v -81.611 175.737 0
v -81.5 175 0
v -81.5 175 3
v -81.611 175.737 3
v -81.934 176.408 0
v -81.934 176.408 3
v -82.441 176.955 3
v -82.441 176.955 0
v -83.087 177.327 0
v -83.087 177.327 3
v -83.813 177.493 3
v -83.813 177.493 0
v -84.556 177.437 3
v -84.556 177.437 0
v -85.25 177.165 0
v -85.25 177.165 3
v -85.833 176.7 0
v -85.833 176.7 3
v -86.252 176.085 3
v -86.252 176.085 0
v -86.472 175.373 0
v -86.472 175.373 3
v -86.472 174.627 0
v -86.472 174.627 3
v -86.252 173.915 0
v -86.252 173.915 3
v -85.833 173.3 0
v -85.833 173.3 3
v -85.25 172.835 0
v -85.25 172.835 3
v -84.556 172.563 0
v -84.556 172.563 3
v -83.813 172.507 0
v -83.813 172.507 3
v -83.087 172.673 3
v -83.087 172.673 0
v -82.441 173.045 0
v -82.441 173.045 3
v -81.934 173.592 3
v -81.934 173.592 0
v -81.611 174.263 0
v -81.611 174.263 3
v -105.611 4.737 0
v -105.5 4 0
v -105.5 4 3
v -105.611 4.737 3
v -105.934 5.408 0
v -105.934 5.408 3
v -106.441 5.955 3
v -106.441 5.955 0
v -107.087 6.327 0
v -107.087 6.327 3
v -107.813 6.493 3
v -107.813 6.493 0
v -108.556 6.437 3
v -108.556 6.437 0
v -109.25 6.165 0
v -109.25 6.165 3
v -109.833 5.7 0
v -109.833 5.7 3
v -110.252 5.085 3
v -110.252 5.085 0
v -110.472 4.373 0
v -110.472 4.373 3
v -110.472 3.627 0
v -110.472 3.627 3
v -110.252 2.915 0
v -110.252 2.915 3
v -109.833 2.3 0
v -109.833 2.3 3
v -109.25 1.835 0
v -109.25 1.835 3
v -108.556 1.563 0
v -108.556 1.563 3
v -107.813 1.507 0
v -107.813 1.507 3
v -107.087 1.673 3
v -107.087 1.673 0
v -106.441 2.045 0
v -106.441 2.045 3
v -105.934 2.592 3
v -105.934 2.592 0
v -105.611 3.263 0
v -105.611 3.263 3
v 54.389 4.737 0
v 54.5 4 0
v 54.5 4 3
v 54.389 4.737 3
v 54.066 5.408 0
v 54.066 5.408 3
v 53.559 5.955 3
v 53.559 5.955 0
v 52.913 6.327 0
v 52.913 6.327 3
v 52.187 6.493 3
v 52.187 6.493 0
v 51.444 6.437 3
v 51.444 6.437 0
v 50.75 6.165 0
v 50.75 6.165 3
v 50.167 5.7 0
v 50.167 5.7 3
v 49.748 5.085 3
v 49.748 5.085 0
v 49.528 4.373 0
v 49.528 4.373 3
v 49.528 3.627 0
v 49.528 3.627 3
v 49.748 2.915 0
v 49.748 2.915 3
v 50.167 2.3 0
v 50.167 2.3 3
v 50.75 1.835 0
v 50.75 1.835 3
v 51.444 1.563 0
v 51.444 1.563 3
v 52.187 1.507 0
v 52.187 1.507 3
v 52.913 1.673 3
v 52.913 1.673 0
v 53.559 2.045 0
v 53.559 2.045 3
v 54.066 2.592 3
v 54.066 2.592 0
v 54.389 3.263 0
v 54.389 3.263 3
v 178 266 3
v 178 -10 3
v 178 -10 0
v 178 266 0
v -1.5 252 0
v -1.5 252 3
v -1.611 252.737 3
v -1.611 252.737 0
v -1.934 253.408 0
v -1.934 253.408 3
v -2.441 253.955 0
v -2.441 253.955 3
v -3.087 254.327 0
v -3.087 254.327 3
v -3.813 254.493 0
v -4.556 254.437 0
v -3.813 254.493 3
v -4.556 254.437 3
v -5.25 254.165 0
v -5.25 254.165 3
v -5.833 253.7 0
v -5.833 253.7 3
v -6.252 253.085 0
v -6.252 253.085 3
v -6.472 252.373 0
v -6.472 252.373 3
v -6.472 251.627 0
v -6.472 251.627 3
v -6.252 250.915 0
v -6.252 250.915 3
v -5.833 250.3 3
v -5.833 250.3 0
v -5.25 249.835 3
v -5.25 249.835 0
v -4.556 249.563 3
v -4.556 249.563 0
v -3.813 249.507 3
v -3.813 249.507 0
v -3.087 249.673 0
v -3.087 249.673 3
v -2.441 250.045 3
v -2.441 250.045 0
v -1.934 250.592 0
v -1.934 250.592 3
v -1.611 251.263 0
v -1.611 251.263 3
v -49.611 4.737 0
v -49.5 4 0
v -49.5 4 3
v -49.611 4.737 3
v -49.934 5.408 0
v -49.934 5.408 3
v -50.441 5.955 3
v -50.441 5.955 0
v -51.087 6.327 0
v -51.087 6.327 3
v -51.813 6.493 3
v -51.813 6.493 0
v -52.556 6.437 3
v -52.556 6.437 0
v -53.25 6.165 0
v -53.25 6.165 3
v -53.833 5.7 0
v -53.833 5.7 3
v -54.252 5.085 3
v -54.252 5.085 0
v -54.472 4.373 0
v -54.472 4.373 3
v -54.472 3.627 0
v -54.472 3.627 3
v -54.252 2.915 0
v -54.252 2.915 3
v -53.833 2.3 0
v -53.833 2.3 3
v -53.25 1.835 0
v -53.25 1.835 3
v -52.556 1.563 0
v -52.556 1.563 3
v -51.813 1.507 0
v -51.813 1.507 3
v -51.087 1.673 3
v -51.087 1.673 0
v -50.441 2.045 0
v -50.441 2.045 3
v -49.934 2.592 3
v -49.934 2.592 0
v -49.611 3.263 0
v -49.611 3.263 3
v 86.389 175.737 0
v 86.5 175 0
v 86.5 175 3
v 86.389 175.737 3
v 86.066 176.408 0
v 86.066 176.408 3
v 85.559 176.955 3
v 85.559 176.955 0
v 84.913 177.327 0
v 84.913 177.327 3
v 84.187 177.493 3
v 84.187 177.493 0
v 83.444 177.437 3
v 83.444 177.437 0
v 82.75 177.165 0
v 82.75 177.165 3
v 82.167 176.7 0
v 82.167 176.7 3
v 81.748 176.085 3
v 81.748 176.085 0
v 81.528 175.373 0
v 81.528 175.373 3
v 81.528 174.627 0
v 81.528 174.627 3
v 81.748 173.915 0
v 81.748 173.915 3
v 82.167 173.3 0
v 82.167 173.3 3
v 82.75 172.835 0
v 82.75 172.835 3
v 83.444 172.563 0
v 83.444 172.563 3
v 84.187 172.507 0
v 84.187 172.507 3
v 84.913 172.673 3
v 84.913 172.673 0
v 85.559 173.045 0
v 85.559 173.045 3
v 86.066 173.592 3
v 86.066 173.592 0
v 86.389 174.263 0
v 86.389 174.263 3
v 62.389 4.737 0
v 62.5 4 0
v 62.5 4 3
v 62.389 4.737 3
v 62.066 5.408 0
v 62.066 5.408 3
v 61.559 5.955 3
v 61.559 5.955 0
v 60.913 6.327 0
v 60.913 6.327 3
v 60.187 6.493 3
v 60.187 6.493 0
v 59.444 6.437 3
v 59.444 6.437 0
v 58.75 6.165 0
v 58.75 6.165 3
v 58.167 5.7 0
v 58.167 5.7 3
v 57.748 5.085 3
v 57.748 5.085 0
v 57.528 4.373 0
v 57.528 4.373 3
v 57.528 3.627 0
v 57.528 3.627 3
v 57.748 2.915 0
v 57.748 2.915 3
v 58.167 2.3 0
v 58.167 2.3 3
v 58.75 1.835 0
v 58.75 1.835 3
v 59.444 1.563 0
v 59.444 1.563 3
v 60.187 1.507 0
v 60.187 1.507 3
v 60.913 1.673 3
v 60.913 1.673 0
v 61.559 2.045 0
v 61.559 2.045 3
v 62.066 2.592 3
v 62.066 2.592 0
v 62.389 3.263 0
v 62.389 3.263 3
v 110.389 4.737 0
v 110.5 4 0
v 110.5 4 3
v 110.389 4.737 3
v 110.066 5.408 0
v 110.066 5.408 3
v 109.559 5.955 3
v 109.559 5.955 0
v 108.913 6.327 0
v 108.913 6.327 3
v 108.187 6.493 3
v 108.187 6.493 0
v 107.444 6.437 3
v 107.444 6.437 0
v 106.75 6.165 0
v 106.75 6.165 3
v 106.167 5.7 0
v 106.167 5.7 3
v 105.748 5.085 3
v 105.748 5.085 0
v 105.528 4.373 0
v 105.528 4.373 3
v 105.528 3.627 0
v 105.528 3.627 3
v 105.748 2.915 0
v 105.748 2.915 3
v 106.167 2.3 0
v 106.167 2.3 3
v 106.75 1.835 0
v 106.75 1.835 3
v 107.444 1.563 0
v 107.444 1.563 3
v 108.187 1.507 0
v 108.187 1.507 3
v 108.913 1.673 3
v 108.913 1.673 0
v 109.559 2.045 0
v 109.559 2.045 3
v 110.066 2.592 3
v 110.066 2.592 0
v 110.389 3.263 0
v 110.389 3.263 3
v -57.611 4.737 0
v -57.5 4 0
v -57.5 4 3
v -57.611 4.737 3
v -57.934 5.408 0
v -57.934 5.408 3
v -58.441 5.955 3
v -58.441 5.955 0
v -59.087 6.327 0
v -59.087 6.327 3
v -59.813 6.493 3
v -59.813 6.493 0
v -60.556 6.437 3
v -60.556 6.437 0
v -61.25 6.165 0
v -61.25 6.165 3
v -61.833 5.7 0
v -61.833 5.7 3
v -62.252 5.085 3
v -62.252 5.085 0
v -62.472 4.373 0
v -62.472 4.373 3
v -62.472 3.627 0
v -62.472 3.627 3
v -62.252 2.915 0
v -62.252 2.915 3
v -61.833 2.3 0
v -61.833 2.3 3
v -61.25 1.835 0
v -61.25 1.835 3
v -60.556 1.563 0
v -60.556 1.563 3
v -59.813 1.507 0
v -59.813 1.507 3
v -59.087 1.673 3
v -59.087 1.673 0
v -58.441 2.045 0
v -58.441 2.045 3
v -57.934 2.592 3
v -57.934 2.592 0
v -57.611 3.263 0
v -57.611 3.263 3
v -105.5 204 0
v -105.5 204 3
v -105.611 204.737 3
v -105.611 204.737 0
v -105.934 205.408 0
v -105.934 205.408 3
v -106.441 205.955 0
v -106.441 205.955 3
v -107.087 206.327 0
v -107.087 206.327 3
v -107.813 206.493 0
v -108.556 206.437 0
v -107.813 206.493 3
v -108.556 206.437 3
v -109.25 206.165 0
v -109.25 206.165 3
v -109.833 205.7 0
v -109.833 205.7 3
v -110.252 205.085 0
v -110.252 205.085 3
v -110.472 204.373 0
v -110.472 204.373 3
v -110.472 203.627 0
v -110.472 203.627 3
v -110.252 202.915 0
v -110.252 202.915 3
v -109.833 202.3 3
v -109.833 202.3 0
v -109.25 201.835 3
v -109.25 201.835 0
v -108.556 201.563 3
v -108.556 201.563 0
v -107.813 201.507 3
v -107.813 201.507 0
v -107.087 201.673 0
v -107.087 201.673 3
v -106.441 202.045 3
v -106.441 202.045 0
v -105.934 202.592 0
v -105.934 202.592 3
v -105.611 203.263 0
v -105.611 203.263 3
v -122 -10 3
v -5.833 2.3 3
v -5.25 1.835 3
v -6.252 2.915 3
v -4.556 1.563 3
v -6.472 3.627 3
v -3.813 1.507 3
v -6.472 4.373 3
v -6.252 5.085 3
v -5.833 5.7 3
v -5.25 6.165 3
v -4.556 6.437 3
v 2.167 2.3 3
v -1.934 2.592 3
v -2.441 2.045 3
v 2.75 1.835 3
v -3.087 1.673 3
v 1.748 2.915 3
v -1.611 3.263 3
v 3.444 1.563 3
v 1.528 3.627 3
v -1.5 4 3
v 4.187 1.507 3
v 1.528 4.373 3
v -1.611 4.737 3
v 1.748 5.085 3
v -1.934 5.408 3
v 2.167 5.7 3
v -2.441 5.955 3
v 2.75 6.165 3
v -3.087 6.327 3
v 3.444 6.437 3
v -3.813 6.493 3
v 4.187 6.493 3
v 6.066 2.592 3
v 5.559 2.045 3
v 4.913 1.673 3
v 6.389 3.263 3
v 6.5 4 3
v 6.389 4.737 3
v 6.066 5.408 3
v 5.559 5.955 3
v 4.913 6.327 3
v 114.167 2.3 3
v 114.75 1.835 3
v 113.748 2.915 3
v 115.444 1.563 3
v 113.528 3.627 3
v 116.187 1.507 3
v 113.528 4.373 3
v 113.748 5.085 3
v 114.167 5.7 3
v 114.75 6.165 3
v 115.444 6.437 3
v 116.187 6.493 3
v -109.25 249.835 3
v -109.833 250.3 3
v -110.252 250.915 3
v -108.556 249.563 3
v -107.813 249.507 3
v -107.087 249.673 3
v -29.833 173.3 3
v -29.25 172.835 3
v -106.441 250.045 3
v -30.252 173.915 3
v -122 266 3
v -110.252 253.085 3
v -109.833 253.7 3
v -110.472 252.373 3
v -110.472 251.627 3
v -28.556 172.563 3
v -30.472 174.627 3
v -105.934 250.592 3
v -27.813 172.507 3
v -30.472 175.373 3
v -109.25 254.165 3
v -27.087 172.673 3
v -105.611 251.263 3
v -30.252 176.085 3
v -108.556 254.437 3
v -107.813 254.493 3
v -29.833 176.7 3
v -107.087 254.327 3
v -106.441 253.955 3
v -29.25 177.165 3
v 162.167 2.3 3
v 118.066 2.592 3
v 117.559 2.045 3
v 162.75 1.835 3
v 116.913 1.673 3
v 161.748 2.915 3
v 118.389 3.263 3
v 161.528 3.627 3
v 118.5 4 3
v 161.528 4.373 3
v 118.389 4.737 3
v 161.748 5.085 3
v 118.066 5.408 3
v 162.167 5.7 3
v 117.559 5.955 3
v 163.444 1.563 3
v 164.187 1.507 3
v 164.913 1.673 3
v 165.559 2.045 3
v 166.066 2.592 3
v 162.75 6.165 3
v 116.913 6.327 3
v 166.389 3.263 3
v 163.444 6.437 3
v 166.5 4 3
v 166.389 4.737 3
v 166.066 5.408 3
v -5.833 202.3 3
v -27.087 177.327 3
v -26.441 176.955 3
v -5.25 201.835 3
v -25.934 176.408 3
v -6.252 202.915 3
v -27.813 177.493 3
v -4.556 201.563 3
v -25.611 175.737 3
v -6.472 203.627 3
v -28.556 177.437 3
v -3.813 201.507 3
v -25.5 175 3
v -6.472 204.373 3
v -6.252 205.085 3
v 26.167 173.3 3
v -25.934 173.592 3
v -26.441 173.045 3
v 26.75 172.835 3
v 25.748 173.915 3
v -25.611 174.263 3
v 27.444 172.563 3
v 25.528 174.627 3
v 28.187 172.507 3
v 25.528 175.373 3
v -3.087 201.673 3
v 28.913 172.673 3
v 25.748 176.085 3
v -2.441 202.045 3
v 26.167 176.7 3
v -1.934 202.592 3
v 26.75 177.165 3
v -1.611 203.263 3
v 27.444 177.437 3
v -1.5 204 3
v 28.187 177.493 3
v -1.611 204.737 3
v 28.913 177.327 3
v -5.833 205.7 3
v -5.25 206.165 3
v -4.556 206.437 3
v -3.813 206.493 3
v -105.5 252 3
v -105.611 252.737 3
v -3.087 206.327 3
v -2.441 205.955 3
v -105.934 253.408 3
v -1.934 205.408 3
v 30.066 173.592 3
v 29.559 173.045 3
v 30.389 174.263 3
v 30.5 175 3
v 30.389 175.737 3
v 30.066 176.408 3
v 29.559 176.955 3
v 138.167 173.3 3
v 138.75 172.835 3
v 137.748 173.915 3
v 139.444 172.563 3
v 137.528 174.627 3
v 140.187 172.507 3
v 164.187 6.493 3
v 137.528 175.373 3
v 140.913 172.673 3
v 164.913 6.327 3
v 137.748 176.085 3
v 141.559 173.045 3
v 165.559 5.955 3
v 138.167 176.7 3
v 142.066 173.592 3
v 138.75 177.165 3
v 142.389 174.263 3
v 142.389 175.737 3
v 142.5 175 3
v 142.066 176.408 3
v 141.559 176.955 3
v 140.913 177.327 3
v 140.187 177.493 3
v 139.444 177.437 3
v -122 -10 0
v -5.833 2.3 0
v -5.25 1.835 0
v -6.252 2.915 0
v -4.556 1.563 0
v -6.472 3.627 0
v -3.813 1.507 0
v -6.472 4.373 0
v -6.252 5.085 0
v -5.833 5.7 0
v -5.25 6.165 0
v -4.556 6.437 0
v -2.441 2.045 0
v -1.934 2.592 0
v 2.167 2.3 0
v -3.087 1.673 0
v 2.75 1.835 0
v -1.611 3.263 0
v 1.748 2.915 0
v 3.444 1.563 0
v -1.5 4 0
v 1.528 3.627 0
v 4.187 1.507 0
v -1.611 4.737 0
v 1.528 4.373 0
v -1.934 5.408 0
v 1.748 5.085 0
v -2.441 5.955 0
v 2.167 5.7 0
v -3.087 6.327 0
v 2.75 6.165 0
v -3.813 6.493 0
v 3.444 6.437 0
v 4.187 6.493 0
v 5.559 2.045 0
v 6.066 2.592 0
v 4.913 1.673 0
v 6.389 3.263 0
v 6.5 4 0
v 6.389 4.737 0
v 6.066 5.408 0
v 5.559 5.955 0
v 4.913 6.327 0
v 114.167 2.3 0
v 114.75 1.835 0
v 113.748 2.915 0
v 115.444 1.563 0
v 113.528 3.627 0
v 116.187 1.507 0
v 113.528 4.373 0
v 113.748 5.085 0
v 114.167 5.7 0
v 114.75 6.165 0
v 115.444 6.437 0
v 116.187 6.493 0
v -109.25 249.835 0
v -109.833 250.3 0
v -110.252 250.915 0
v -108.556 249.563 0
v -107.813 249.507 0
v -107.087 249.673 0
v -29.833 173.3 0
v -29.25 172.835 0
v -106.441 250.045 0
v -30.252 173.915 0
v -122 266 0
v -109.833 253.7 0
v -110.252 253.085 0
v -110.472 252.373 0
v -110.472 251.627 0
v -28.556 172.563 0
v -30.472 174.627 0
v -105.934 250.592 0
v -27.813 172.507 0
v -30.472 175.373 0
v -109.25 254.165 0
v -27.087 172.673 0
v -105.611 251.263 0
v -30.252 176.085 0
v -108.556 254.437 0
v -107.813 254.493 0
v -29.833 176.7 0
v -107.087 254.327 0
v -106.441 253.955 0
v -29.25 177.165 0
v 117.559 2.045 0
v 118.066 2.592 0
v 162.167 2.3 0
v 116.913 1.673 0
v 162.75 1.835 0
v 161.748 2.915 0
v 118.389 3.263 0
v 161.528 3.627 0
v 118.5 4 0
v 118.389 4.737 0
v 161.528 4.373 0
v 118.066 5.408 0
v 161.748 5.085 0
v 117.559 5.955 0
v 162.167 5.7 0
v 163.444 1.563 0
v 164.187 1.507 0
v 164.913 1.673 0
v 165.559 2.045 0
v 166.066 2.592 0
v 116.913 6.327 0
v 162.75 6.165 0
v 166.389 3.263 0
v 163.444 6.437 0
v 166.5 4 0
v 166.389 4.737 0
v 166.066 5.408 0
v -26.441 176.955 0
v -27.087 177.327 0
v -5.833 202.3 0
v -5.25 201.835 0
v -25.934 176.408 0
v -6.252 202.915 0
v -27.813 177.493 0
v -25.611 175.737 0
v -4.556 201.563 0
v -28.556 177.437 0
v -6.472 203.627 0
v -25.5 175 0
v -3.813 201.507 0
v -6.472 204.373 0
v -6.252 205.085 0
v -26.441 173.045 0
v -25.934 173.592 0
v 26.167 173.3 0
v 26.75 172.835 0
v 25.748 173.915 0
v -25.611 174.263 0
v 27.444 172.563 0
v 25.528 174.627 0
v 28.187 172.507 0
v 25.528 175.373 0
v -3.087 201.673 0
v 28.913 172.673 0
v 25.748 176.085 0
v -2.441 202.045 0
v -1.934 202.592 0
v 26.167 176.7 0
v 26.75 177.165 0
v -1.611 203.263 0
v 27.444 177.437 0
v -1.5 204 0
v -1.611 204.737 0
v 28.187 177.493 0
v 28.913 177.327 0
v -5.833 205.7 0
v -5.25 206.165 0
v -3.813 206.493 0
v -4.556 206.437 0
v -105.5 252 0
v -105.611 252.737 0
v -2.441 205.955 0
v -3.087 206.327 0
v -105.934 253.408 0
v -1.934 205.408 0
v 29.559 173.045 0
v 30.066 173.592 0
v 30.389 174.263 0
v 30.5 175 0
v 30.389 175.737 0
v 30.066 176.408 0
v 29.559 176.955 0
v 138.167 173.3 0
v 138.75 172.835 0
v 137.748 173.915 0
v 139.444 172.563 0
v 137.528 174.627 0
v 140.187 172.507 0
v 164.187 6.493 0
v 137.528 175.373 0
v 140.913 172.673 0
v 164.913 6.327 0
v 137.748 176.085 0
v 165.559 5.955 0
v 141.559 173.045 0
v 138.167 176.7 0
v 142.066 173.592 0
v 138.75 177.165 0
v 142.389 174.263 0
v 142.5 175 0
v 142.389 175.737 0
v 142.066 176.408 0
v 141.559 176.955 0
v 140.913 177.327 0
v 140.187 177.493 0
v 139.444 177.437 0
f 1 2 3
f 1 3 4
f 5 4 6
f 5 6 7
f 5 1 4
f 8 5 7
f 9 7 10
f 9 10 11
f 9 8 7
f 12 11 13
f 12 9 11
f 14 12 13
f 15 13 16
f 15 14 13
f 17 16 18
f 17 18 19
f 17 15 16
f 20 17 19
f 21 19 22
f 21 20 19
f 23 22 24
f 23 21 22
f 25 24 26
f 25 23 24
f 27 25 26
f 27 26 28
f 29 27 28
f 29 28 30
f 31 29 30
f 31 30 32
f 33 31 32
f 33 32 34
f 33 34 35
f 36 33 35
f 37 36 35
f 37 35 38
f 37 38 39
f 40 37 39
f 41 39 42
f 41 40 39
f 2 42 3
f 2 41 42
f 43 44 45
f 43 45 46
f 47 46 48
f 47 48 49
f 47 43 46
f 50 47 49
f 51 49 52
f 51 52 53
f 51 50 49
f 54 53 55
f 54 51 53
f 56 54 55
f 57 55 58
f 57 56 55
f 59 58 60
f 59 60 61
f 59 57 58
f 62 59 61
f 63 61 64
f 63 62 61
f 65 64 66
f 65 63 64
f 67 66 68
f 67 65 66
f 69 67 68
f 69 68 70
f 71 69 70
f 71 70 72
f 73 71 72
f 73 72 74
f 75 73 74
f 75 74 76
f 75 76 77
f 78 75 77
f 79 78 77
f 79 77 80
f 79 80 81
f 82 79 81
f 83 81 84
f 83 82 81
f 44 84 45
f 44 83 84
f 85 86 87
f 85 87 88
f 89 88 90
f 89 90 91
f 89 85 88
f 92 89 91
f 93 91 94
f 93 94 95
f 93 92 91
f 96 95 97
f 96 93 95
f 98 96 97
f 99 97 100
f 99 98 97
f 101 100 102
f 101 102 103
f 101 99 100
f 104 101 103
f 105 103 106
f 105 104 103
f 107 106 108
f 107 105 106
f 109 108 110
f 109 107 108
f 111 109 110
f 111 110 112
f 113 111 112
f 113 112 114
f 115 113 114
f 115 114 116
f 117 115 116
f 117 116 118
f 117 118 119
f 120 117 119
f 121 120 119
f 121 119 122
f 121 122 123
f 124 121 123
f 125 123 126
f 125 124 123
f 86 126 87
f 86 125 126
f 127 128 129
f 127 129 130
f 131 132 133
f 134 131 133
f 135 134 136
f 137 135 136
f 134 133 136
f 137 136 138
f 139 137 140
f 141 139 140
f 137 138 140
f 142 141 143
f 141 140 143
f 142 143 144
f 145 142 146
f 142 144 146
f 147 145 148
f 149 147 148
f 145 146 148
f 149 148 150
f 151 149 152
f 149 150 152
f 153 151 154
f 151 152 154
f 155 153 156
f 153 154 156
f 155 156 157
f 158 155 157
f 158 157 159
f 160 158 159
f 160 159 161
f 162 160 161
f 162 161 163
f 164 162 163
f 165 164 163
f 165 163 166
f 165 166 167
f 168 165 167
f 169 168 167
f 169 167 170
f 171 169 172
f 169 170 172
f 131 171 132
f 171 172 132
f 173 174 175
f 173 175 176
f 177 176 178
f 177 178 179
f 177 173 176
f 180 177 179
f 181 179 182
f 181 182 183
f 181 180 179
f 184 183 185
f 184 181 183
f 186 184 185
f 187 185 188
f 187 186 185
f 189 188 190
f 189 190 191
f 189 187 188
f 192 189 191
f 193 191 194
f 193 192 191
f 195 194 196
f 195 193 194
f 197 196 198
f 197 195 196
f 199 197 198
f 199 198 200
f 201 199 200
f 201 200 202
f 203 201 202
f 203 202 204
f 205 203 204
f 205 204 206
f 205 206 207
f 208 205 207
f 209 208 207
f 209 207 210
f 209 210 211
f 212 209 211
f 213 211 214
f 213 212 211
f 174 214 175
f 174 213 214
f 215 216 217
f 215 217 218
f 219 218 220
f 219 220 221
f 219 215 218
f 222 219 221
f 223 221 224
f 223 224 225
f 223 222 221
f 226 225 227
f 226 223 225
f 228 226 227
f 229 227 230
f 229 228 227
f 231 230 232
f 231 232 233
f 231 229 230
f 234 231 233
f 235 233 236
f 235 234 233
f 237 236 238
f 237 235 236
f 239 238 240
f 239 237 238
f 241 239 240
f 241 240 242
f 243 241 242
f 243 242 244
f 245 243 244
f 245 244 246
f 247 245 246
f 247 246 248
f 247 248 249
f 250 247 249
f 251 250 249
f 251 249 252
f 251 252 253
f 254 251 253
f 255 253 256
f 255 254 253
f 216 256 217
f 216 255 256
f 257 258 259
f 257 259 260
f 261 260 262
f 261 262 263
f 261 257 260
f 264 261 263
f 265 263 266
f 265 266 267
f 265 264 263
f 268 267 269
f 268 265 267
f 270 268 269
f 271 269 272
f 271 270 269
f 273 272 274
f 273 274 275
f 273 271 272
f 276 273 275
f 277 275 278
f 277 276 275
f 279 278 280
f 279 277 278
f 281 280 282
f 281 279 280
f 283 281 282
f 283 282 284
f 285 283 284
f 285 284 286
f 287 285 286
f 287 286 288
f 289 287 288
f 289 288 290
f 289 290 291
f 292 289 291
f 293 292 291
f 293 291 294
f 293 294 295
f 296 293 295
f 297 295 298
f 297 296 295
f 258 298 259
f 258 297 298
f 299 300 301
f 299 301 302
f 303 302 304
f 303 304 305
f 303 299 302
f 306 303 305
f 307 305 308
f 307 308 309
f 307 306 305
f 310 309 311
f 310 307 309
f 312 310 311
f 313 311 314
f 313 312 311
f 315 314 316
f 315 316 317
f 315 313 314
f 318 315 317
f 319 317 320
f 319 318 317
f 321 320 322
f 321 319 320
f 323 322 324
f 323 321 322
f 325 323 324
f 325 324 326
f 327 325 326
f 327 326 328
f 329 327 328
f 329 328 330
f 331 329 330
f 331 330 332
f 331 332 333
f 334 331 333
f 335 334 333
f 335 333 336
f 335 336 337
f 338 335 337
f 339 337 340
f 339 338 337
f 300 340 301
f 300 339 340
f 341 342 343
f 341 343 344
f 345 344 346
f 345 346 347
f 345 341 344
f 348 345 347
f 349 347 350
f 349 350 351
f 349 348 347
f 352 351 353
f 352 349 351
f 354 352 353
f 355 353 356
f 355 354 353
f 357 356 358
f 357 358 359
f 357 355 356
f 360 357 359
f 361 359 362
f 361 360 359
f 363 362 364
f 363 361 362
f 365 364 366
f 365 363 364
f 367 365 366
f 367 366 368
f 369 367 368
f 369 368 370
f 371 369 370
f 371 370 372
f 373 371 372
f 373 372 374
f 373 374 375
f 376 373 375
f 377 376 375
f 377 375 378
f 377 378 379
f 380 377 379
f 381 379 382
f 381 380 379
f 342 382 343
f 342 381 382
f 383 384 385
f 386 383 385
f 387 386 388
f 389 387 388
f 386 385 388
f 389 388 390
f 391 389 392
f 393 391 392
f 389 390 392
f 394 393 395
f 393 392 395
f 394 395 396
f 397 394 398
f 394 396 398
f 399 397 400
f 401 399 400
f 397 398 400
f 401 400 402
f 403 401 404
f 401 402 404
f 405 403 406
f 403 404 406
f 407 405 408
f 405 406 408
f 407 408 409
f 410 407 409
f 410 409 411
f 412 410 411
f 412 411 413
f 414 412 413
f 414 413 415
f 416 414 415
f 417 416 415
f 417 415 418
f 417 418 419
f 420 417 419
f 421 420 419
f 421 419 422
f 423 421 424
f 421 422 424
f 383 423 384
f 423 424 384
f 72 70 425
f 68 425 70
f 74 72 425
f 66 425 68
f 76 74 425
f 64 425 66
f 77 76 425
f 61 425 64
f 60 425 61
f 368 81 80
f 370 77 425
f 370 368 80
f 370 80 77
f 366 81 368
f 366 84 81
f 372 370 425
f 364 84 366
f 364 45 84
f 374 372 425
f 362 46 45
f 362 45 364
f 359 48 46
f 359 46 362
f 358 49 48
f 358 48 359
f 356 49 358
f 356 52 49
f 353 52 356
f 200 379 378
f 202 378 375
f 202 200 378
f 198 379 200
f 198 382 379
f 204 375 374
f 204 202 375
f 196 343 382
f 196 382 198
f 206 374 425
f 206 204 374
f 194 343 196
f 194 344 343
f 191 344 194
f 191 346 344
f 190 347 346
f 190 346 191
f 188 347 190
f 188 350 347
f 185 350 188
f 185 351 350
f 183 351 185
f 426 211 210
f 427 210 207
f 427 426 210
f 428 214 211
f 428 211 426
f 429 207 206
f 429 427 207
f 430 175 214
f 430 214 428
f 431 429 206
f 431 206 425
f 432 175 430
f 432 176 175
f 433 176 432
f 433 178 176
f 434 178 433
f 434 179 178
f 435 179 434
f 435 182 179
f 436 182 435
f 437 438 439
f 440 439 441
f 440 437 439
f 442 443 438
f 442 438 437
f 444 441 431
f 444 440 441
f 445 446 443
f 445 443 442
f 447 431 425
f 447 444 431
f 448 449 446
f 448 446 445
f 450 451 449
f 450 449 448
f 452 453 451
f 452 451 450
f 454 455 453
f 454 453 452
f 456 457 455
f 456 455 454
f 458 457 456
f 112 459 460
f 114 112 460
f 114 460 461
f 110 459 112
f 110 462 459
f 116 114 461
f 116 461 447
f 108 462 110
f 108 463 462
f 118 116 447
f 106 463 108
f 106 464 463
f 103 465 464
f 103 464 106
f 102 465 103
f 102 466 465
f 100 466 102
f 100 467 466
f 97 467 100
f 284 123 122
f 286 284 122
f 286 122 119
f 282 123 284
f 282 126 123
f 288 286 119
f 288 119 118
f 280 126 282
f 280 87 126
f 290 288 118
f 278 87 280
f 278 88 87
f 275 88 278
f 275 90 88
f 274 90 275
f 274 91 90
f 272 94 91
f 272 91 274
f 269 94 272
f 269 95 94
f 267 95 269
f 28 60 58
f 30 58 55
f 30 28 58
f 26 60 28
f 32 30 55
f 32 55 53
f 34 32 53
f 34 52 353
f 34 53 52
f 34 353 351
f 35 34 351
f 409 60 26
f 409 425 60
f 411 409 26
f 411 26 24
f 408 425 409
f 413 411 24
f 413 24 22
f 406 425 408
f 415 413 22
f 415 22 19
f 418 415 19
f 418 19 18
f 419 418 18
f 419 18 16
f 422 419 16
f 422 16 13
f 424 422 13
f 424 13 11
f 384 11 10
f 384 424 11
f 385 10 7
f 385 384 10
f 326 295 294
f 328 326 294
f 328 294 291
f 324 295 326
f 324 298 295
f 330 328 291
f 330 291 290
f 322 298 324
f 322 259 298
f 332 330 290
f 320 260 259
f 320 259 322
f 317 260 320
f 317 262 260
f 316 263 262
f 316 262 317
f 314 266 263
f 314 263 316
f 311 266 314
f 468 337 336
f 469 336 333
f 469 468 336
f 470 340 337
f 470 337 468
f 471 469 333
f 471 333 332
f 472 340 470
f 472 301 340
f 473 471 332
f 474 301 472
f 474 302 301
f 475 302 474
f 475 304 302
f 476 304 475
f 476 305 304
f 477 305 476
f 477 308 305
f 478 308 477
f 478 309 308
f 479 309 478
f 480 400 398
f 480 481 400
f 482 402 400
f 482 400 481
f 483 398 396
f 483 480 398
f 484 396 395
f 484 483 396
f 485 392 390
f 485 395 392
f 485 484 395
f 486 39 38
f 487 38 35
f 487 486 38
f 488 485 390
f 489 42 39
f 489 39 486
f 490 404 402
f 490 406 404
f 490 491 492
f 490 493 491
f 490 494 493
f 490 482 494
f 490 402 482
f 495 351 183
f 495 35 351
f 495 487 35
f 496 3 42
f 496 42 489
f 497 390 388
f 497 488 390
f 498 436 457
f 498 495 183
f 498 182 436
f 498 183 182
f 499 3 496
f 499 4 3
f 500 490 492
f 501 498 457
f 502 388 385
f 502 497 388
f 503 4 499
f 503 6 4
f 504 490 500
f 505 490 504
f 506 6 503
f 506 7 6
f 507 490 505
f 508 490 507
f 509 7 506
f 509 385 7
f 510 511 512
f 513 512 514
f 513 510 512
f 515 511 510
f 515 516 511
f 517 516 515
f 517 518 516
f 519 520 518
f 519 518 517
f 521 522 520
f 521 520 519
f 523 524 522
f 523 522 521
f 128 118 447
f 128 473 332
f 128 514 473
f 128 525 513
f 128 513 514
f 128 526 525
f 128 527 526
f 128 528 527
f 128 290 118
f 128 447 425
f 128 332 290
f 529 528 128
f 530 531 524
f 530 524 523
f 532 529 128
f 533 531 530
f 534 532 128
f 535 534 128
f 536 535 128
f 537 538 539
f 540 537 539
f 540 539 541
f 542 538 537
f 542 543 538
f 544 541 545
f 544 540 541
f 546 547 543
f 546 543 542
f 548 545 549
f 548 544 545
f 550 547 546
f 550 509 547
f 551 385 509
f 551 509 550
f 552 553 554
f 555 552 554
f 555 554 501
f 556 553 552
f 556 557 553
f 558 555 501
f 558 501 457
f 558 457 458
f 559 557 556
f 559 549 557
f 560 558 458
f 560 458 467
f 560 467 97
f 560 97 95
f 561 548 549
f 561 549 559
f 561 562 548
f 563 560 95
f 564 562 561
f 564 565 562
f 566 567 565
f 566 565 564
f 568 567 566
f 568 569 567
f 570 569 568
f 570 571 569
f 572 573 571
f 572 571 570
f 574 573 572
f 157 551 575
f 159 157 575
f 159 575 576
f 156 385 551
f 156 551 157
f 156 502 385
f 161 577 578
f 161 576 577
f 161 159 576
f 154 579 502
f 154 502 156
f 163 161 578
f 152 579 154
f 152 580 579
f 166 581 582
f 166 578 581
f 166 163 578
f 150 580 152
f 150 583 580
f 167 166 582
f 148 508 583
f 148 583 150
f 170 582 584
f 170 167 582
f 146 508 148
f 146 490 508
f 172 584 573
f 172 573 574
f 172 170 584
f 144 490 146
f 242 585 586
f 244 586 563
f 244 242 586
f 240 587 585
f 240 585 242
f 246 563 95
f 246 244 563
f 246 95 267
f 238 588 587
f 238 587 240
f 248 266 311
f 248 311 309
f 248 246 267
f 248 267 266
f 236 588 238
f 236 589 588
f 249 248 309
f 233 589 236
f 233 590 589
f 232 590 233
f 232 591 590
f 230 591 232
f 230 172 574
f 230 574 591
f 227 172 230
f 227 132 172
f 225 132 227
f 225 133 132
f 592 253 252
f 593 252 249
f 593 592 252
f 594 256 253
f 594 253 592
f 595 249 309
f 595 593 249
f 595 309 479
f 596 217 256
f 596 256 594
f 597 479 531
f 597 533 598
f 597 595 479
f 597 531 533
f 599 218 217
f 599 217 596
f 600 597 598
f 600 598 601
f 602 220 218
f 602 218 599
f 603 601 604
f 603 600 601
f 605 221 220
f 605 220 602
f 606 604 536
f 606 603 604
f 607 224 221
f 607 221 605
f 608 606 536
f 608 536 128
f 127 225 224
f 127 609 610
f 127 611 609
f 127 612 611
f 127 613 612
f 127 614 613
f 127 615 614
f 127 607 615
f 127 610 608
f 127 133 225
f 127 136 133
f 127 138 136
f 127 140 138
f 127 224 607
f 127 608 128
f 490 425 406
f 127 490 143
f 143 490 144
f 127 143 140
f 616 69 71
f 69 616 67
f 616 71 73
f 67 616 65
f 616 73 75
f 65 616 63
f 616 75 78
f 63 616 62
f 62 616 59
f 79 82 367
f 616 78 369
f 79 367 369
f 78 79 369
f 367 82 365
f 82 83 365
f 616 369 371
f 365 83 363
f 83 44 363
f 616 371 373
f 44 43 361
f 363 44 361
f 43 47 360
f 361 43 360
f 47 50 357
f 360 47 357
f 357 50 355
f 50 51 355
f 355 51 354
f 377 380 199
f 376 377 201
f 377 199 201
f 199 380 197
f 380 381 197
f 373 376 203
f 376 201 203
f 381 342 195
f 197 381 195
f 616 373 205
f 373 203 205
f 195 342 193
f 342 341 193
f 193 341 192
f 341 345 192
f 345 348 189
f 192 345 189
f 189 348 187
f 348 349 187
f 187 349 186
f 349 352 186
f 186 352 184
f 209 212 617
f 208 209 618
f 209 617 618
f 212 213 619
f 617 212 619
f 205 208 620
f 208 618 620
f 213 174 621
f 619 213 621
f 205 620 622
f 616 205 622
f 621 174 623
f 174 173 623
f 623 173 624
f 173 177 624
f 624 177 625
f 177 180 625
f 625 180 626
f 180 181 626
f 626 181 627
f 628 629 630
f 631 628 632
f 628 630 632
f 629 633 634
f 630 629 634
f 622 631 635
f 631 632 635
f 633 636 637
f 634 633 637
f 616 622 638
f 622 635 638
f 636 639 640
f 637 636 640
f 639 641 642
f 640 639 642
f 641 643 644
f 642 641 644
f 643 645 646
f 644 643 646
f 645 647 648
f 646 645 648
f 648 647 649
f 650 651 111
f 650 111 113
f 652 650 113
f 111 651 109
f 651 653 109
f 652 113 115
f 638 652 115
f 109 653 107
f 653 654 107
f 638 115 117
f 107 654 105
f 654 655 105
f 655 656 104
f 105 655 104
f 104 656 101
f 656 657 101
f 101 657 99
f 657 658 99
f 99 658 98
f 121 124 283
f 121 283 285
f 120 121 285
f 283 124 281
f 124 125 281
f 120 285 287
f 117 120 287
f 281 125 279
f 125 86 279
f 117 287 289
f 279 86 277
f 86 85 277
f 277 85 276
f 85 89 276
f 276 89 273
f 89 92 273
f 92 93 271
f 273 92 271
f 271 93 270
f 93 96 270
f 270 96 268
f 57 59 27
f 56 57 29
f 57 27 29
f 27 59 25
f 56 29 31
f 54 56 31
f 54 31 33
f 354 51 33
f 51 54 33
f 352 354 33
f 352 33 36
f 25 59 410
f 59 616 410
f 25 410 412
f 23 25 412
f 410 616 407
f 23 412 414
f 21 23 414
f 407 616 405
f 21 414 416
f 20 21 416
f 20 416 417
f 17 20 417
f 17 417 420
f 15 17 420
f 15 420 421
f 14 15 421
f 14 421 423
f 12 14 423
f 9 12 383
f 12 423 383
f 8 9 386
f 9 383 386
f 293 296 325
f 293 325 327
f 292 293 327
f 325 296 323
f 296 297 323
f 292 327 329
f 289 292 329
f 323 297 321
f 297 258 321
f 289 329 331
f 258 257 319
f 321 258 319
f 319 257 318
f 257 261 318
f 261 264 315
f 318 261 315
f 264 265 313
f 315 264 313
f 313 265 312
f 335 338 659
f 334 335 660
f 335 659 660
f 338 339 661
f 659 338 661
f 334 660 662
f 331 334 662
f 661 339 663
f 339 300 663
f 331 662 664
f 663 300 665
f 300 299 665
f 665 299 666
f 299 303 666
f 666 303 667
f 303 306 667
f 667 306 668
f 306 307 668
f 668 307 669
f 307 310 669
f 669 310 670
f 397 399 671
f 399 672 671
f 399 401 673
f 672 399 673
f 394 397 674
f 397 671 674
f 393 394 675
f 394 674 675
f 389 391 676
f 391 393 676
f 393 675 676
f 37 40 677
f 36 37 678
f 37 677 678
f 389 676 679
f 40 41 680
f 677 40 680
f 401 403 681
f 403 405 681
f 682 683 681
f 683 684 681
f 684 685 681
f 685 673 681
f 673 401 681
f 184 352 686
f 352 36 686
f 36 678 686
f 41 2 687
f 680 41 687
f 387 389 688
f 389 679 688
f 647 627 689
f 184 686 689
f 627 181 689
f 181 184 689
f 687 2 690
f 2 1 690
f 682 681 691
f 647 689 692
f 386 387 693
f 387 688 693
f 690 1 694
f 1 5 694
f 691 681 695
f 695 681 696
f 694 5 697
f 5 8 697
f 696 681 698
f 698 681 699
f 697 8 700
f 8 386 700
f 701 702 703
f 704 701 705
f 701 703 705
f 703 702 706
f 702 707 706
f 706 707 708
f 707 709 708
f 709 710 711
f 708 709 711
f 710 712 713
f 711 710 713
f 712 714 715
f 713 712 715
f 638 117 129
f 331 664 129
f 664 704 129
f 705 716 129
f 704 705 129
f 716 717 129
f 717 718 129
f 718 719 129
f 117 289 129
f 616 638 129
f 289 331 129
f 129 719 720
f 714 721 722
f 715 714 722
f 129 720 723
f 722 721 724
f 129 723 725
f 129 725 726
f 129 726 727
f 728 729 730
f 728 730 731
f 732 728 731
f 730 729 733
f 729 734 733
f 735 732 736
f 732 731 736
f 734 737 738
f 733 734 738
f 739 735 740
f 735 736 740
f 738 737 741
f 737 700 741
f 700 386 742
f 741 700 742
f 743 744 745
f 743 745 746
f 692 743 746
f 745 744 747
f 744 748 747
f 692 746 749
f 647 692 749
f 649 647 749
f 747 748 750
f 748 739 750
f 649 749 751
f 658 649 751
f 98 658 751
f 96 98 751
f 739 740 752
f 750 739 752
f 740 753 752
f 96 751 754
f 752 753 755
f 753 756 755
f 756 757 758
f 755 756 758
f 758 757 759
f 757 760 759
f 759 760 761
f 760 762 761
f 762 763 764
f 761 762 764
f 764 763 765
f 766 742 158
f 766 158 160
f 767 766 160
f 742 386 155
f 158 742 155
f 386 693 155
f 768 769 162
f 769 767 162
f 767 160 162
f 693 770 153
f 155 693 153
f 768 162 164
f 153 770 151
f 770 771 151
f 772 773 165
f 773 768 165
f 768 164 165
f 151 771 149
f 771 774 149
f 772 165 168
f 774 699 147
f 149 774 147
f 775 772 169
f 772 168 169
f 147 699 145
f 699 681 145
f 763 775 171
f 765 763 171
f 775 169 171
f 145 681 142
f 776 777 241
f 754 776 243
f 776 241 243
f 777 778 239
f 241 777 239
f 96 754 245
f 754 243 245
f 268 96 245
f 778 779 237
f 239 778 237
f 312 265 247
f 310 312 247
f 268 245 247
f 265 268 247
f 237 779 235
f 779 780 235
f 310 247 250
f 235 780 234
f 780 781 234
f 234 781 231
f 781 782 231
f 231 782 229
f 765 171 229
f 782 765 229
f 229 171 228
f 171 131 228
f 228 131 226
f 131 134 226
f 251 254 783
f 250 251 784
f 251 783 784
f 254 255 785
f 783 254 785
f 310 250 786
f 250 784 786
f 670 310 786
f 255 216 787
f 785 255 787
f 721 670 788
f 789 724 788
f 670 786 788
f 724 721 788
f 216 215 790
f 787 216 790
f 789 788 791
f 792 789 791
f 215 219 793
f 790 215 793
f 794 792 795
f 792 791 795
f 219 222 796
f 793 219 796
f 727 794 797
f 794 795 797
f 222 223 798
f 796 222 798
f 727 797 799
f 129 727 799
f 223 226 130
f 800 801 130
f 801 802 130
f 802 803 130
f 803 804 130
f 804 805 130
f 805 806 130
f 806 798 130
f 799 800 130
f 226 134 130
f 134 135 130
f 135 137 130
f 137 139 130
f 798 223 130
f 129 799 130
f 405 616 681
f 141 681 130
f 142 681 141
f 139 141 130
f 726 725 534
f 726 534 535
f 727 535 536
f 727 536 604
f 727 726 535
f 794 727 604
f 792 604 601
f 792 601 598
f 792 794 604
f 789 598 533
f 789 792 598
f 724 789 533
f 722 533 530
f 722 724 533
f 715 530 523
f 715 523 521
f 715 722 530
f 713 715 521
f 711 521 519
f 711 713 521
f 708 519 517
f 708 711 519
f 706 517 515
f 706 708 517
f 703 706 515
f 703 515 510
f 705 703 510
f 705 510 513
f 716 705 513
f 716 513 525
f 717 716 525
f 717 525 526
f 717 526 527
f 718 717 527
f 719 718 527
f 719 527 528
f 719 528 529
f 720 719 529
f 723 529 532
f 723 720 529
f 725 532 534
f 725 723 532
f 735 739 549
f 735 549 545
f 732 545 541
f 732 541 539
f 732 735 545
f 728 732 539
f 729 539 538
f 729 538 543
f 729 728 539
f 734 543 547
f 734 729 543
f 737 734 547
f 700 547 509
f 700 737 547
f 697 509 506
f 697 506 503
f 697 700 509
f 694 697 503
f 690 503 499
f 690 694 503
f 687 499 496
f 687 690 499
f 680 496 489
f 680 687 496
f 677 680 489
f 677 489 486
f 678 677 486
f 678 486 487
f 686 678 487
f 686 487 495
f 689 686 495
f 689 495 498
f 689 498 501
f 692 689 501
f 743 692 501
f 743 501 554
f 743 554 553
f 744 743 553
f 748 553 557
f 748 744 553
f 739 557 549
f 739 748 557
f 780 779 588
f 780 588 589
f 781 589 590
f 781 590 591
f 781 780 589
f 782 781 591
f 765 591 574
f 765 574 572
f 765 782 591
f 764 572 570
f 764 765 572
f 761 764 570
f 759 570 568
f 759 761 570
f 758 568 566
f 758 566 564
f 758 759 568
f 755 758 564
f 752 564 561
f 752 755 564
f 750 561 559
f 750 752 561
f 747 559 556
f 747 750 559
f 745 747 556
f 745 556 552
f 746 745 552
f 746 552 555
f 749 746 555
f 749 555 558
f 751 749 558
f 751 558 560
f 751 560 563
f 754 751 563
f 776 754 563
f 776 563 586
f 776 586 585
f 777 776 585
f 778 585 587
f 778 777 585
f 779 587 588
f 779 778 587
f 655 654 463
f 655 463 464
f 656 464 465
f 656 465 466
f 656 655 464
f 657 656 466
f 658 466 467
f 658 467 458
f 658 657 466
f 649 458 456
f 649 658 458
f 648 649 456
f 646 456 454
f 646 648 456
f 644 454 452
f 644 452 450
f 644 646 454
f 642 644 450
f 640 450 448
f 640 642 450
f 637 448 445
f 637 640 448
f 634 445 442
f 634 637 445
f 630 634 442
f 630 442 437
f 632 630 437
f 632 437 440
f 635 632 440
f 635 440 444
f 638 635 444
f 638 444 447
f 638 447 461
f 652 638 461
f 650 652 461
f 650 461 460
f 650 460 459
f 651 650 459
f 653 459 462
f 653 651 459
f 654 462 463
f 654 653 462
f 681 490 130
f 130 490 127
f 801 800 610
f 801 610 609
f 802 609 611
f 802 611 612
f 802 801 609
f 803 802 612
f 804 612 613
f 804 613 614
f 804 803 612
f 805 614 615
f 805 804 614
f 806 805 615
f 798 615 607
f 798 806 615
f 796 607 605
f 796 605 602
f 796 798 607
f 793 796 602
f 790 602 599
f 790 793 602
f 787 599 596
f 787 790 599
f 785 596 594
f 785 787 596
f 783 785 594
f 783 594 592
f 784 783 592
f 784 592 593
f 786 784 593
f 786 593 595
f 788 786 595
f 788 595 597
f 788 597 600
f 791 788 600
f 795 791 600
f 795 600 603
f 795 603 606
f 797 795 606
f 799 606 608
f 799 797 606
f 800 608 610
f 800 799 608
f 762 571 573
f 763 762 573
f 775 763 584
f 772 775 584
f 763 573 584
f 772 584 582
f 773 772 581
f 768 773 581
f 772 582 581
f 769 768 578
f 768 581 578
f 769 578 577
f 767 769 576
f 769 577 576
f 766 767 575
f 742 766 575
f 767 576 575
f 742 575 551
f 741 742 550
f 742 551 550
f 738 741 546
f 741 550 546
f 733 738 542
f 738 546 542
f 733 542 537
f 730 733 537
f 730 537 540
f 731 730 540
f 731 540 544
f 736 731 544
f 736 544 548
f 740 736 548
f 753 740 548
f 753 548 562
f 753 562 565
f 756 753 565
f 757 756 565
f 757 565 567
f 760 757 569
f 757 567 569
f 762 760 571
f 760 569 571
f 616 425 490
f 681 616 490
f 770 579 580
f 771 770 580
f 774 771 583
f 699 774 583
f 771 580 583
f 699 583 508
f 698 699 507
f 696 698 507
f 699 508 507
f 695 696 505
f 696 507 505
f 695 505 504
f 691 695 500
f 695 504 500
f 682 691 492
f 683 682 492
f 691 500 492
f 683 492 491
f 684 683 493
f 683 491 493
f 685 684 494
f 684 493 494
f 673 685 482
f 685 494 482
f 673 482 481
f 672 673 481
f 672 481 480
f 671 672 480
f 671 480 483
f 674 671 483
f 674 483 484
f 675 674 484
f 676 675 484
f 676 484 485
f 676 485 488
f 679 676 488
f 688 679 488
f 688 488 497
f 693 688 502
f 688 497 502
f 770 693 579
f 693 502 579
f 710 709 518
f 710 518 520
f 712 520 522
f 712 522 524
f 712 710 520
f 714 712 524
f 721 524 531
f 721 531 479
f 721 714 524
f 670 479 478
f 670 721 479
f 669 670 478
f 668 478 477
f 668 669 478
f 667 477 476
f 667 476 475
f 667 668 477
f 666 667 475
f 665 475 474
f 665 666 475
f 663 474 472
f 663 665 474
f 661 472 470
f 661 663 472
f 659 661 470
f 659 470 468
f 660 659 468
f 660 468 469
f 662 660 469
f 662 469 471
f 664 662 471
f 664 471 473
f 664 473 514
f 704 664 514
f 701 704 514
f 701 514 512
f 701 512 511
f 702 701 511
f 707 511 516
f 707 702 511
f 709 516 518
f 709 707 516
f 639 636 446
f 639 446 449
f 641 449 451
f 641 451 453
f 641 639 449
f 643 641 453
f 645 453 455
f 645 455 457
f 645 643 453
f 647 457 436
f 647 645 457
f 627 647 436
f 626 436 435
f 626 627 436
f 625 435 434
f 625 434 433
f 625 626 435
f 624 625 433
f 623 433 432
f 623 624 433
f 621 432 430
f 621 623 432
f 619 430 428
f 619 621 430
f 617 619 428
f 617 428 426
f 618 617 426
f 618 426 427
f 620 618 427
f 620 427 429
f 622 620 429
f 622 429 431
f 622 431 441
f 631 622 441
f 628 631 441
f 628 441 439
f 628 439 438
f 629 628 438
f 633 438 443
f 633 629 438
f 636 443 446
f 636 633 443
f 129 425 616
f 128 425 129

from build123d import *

# Parameters (mm, degrees)
SKETCH1_W           = 280
SKETCH1_H           = 200
SKETCH1_R           = 2.5
BOSS_EXTRUDE1_DEPTH = 3
SKETCH3_W           = 10
SKETCH3_H           = 200
BOSS_EXTRUDE2_DEPTH = 3
SKETCH4_W           = 300
SKETCH4_H           = 10
BOSS_EXTRUDE3_DEPTH = 3
SKETCH5_W           = 300
SKETCH5_H           = 66
SKETCH5_R           = 2.5
BOSS_EXTRUDE4_DEPTH = 3


with BuildPart() as part:
    # Sketch1 → Boss-Extrude1 (new body)
    with BuildSketch(Plane.XY):
        with Locations((28, 100)):
            Rectangle(SKETCH1_W, SKETCH1_H)
        with Locations((-108, 4)):
            Circle(SKETCH1_R, mode=Mode.SUBTRACT)
        with Locations((-60, 4)):
            Circle(SKETCH1_R, mode=Mode.SUBTRACT)
        with Locations((-52, 4)):
            Circle(SKETCH1_R, mode=Mode.SUBTRACT)
        with Locations((-4, 4)):
            Circle(SKETCH1_R, mode=Mode.SUBTRACT)
        with Locations((4, 4)):
            Circle(SKETCH1_R, mode=Mode.SUBTRACT)
        with Locations((52, 4)):
            Circle(SKETCH1_R, mode=Mode.SUBTRACT)
        with Locations((60, 4)):
            Circle(SKETCH1_R, mode=Mode.SUBTRACT)
        with Locations((108, 4)):
            Circle(SKETCH1_R, mode=Mode.SUBTRACT)
        with Locations((116, 4)):
            Circle(SKETCH1_R, mode=Mode.SUBTRACT)
        with Locations((164, 4)):
            Circle(SKETCH1_R, mode=Mode.SUBTRACT)
        with Locations((140, 175)):
            Circle(SKETCH1_R, mode=Mode.SUBTRACT)
        with Locations((84, 175)):
            Circle(SKETCH1_R, mode=Mode.SUBTRACT)
        with Locations((28, 175)):
            Circle(SKETCH1_R, mode=Mode.SUBTRACT)
        with Locations((-28, 175)):
            Circle(SKETCH1_R, mode=Mode.SUBTRACT)
        with Locations((-84, 175)):
            Circle(SKETCH1_R, mode=Mode.SUBTRACT)
    extrude(amount=BOSS_EXTRUDE1_DEPTH)

    # Sketch3 → Boss-Extrude2 (add)
    with BuildSketch(Plane.XY.offset(3)):
        with Locations((-117, 100)):
            Rectangle(SKETCH3_W, SKETCH3_H)
        with Locations((173, 100)):
            Rectangle(SKETCH3_W, SKETCH3_H)
    extrude(amount=-BOSS_EXTRUDE2_DEPTH)

    # Sketch4 → Boss-Extrude3 (add)
    with BuildSketch(Plane.XY.offset(3)):
        with Locations((28, -5)):
            Rectangle(SKETCH4_W, SKETCH4_H)
    extrude(amount=-BOSS_EXTRUDE3_DEPTH)

    # Sketch5 → Boss-Extrude4 (add)
    with BuildSketch(Plane.XY.offset(3)):
        with Locations((28, 233)):
            Rectangle(SKETCH5_W, SKETCH5_H)
        with Locations((-4, 204)):
            Circle(SKETCH5_R, mode=Mode.SUBTRACT)
        with Locations((-4, 252)):
            Circle(SKETCH5_R, mode=Mode.SUBTRACT)
        with Locations((-108, 252)):
            Circle(SKETCH5_R, mode=Mode.SUBTRACT)
        with Locations((-108, 204)):
            Circle(SKETCH5_R, mode=Mode.SUBTRACT)
    extrude(amount=-BOSS_EXTRUDE4_DEPTH)


solid = part.part
